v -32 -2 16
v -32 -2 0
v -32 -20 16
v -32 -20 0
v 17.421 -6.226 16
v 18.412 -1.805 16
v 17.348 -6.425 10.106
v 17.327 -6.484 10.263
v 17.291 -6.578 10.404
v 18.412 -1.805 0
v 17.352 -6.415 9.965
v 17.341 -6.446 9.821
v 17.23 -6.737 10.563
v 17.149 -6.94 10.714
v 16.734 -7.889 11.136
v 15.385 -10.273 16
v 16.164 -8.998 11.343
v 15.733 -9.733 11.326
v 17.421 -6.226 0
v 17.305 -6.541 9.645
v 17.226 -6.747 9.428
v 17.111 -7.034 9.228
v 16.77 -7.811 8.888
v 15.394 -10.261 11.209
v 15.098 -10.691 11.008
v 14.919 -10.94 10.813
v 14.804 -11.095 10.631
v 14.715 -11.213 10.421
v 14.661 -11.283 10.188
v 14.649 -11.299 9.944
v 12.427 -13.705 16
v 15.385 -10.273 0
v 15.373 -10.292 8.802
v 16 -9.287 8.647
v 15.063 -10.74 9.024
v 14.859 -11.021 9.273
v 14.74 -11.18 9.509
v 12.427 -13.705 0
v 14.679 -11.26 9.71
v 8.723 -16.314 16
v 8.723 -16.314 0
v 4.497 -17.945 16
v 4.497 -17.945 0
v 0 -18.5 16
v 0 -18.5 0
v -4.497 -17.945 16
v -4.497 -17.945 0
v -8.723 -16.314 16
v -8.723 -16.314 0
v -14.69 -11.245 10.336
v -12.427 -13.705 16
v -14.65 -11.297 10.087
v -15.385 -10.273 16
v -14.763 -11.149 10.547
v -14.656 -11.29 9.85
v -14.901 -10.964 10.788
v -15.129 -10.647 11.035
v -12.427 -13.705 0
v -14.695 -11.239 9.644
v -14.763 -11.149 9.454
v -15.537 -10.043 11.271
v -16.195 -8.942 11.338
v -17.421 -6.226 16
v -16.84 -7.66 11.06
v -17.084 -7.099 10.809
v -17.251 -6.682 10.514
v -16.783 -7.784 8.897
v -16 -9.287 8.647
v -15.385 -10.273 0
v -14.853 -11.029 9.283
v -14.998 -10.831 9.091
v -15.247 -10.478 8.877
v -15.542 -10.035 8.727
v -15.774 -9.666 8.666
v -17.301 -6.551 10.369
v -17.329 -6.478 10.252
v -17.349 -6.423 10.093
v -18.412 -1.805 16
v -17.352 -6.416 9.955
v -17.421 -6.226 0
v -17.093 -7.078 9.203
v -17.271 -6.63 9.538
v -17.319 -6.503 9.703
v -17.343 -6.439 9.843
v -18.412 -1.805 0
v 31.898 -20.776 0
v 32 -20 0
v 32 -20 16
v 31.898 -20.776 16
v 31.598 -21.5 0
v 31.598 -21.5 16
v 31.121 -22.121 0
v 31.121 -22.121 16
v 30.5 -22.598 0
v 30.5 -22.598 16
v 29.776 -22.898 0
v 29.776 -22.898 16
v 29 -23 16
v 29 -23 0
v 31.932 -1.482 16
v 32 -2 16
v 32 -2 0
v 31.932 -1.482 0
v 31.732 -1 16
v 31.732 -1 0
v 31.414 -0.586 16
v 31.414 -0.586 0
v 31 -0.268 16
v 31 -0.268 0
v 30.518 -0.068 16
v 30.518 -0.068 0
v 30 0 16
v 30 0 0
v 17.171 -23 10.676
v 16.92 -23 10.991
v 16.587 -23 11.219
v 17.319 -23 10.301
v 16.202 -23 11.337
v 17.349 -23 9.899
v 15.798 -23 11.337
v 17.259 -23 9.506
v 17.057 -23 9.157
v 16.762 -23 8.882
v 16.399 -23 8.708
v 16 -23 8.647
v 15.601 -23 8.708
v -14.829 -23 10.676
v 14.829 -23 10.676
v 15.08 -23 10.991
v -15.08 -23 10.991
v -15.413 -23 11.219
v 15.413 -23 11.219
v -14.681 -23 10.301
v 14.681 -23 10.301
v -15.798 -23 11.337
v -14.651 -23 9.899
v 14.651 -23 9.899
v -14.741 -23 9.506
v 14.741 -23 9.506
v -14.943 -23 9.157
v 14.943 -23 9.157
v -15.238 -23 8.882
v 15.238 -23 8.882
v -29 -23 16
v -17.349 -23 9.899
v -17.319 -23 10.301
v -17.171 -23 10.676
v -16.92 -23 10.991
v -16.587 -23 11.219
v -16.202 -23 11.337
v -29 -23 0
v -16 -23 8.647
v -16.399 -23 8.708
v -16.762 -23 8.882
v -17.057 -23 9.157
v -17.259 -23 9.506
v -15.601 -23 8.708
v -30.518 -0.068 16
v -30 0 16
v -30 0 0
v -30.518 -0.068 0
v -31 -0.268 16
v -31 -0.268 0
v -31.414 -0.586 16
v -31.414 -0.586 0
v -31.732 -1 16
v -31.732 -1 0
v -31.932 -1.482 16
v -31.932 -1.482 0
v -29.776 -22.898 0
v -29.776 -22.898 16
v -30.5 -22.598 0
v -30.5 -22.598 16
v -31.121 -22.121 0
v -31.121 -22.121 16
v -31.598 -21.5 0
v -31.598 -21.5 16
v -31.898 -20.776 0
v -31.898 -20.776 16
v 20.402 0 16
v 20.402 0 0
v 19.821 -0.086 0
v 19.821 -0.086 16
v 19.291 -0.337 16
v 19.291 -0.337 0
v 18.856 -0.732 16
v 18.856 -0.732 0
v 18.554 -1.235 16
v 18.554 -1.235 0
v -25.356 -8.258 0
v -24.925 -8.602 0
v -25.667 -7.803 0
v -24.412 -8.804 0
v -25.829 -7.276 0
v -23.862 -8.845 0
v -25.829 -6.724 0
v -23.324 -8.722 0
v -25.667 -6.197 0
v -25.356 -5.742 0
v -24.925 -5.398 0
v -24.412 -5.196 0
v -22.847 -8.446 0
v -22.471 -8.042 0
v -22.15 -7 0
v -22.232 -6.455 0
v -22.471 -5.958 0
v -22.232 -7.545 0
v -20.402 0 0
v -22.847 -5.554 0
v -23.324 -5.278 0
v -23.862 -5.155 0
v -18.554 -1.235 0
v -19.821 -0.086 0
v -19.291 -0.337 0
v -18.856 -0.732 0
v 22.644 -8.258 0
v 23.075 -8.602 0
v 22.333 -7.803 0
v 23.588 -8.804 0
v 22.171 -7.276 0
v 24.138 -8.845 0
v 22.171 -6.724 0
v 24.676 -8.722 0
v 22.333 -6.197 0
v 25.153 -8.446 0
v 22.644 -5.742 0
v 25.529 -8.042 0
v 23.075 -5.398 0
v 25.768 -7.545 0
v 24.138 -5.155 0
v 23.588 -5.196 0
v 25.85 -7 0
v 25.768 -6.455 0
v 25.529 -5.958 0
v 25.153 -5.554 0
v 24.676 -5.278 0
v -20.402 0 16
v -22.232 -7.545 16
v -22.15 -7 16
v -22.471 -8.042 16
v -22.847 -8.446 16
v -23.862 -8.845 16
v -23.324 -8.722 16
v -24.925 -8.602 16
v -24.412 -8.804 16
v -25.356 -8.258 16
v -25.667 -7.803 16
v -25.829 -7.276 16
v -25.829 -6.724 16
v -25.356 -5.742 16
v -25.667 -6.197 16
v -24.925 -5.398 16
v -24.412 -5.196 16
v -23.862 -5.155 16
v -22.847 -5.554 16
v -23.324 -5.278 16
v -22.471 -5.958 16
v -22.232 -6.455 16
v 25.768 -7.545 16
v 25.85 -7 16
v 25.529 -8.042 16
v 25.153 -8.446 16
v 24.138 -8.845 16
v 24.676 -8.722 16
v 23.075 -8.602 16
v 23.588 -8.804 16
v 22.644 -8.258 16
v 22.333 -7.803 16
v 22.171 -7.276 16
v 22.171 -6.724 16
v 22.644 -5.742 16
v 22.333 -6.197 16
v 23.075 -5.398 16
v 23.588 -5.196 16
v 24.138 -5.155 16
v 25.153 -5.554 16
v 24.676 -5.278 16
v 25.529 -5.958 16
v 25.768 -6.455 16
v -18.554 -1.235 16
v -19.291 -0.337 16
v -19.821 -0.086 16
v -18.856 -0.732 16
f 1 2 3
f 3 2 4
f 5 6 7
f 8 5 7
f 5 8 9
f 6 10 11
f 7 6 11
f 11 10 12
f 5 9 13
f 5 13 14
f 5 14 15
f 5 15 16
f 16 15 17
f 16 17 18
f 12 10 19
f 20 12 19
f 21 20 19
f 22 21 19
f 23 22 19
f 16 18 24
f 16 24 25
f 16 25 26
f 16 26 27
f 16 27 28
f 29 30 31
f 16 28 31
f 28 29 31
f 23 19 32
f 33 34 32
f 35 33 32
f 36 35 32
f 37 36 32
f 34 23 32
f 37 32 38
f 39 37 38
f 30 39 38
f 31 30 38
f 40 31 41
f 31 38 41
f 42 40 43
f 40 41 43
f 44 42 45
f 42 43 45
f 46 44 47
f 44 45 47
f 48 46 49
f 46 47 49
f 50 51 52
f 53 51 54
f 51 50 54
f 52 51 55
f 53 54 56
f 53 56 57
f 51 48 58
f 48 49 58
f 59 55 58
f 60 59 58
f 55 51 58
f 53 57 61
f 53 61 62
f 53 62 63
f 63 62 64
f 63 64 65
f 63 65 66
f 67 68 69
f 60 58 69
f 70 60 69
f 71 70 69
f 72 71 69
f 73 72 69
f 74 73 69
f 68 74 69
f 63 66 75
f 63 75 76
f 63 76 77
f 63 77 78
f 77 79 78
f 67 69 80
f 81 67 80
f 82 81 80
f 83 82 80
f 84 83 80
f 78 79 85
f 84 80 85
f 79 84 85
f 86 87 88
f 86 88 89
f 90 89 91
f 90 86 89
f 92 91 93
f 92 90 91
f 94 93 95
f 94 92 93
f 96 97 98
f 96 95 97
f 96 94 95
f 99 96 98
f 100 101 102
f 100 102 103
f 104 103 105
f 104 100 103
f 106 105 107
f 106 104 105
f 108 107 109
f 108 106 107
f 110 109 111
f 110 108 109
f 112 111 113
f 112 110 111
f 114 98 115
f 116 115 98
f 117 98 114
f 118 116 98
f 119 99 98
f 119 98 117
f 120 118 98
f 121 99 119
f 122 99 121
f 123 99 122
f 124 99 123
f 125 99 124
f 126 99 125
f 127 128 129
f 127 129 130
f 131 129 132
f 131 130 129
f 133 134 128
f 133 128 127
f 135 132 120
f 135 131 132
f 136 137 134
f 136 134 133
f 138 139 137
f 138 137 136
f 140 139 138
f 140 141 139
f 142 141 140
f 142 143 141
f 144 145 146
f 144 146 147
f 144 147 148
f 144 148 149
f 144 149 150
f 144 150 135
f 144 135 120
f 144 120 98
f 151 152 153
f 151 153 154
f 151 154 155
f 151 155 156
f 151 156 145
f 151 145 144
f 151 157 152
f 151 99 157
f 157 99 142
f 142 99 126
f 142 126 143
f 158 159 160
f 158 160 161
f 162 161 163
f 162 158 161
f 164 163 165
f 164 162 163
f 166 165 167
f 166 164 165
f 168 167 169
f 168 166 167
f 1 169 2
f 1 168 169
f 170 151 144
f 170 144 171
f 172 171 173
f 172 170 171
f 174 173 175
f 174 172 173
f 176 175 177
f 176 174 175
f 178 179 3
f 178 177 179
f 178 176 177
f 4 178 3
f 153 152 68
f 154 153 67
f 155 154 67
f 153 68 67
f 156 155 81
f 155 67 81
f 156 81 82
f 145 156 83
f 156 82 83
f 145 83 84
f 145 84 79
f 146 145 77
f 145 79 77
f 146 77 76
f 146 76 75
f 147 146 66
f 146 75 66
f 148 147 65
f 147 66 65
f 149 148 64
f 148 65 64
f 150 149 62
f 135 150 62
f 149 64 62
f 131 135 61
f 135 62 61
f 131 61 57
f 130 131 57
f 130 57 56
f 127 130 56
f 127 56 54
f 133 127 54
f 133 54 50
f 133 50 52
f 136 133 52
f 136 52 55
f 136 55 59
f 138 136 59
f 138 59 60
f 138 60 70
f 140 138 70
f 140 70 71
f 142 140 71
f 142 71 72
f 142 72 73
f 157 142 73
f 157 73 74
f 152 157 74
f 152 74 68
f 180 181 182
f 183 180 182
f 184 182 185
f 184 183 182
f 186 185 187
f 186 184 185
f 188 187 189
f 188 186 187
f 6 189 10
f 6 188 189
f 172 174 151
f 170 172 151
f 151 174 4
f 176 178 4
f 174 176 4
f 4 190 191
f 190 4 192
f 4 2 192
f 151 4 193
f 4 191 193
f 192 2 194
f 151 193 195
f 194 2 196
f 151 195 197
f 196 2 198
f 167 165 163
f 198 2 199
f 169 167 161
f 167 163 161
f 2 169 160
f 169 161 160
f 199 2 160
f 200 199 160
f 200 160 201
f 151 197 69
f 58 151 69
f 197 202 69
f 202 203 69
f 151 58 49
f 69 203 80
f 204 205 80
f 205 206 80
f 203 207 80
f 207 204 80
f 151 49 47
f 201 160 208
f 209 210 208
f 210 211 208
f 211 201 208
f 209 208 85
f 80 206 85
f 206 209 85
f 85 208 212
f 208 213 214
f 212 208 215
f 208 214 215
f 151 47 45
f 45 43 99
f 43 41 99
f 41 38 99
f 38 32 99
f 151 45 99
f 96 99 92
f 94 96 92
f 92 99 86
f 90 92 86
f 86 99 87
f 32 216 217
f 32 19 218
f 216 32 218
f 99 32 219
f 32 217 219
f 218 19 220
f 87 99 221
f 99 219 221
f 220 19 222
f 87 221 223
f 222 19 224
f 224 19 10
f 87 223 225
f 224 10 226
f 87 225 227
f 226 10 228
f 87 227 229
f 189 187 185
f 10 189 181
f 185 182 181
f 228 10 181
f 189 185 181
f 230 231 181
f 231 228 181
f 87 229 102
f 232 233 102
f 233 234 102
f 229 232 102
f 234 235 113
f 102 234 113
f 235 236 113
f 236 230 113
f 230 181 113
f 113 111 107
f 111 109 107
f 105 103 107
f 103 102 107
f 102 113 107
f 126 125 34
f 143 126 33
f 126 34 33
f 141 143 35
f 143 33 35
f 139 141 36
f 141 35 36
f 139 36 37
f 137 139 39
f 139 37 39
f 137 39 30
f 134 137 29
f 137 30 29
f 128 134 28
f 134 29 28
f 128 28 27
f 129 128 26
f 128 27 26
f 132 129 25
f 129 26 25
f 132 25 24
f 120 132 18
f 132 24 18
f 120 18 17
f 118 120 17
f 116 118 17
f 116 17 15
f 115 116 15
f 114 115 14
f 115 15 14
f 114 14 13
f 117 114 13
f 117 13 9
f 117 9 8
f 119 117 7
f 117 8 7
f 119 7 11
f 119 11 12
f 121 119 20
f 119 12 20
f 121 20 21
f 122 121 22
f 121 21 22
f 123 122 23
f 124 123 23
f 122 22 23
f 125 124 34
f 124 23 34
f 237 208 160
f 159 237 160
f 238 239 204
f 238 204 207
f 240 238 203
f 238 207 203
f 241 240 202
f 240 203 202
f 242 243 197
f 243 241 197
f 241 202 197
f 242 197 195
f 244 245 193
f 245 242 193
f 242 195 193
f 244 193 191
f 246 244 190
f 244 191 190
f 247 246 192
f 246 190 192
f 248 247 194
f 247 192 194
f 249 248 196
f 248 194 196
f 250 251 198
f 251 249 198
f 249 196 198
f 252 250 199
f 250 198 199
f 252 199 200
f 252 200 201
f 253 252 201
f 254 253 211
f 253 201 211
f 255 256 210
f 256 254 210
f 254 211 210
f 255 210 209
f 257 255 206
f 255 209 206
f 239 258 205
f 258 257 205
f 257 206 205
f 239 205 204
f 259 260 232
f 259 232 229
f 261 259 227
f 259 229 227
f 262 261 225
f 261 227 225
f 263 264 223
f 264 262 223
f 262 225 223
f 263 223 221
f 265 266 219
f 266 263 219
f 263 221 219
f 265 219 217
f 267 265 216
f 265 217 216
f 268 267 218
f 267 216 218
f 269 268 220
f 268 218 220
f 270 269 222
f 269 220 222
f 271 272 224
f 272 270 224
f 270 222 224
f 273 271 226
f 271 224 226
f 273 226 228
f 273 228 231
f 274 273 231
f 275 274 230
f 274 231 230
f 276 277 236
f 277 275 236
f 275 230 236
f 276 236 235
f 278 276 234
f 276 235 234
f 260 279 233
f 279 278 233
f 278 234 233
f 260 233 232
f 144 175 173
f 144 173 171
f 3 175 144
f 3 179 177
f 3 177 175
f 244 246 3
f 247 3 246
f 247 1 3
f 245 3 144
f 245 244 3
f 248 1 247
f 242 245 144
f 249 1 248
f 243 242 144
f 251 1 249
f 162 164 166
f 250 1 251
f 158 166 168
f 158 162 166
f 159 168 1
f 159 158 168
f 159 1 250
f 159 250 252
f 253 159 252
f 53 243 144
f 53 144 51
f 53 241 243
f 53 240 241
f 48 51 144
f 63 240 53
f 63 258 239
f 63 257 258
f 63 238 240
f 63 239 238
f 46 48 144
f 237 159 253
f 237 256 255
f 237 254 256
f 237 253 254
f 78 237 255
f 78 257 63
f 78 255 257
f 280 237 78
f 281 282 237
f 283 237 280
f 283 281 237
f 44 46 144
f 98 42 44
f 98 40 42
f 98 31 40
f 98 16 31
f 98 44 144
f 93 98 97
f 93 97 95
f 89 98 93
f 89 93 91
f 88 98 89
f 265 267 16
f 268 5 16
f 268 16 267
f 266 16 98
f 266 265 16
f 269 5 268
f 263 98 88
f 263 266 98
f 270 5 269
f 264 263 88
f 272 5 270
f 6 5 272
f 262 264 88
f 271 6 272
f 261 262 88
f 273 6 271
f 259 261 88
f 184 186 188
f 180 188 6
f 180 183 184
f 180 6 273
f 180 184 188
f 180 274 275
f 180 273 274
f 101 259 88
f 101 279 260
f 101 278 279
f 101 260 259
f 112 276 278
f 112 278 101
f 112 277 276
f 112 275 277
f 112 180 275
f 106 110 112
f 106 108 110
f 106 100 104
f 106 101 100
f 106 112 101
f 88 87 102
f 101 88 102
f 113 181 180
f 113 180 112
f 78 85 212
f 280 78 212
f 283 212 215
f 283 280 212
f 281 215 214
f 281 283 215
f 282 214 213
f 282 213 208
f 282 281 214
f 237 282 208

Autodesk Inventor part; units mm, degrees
ref_plane "YZ Plane" through (0, 0, 0) normal (1, 0, 0) x (0, 1, 0)
ref_plane "XZ Plane" through (0, 0, 0) normal (0, 1, 0) x (-1, 0, 0)
ref_plane "XY Plane" through (0, 0, 0) normal (0, 0, 1) x (1, 0, 0)
sketch "Sketch1" plane through (0, 0, 0) normal (0, 0, 1) x (1, 0, 0)
  arc A0 (-18.5, 0) -> (18.5, 0) centre (0, 0) ccw projected
  line L0 (18.5, 0) -> (32.0244, 0)
  line L1 (96, -23) -> (-64, -23) projected
  circle A1 centre (24, -7) radius 1.85 projected
  circle A2 centre (-24, -7) radius 1.85 projected
  line L2 (32, -20) -> (32, 6) projected
  line L3 (-32, 6) -> (-32, -20) projected
  line L4 (-18.5, 0) -> (-32, 0)
  line L5 (-32, -20) -> (-32, -23)
  arc A3 (29, -23) -> (32, -20) centre (29, -20) ccw projected
  arc A4 (-32, -20) -> (-29, -23) centre (-29, -20) ccw projected
  point P0 (32, 0)
extrude "Extrusion1" add sketch "Sketch1" along normal blind 16 contours A0 L0 L2 A3 L1 A4 L3 L4
sketch "Sketch2" plane through (-29, -23, 0) normal (0, -1, 0) x (1, 0, 0)
  circle A0 centre (45, 10) radius 1.85
  circle A1 centre (13, 10) radius 1.85
  point P0 (29, 0)
hole "Hole1" at (16, -23, 10) at (-16, -23, 10) direction (0, 1, 0) diameter 2.7051 end through all
fillet "Fillet1" radius 2 4 edges at (32, 0, 8) (18.5, 0, 8) (-18.5, 0, 8) (-32, 0, 8)
properties part number "motorsupport"
